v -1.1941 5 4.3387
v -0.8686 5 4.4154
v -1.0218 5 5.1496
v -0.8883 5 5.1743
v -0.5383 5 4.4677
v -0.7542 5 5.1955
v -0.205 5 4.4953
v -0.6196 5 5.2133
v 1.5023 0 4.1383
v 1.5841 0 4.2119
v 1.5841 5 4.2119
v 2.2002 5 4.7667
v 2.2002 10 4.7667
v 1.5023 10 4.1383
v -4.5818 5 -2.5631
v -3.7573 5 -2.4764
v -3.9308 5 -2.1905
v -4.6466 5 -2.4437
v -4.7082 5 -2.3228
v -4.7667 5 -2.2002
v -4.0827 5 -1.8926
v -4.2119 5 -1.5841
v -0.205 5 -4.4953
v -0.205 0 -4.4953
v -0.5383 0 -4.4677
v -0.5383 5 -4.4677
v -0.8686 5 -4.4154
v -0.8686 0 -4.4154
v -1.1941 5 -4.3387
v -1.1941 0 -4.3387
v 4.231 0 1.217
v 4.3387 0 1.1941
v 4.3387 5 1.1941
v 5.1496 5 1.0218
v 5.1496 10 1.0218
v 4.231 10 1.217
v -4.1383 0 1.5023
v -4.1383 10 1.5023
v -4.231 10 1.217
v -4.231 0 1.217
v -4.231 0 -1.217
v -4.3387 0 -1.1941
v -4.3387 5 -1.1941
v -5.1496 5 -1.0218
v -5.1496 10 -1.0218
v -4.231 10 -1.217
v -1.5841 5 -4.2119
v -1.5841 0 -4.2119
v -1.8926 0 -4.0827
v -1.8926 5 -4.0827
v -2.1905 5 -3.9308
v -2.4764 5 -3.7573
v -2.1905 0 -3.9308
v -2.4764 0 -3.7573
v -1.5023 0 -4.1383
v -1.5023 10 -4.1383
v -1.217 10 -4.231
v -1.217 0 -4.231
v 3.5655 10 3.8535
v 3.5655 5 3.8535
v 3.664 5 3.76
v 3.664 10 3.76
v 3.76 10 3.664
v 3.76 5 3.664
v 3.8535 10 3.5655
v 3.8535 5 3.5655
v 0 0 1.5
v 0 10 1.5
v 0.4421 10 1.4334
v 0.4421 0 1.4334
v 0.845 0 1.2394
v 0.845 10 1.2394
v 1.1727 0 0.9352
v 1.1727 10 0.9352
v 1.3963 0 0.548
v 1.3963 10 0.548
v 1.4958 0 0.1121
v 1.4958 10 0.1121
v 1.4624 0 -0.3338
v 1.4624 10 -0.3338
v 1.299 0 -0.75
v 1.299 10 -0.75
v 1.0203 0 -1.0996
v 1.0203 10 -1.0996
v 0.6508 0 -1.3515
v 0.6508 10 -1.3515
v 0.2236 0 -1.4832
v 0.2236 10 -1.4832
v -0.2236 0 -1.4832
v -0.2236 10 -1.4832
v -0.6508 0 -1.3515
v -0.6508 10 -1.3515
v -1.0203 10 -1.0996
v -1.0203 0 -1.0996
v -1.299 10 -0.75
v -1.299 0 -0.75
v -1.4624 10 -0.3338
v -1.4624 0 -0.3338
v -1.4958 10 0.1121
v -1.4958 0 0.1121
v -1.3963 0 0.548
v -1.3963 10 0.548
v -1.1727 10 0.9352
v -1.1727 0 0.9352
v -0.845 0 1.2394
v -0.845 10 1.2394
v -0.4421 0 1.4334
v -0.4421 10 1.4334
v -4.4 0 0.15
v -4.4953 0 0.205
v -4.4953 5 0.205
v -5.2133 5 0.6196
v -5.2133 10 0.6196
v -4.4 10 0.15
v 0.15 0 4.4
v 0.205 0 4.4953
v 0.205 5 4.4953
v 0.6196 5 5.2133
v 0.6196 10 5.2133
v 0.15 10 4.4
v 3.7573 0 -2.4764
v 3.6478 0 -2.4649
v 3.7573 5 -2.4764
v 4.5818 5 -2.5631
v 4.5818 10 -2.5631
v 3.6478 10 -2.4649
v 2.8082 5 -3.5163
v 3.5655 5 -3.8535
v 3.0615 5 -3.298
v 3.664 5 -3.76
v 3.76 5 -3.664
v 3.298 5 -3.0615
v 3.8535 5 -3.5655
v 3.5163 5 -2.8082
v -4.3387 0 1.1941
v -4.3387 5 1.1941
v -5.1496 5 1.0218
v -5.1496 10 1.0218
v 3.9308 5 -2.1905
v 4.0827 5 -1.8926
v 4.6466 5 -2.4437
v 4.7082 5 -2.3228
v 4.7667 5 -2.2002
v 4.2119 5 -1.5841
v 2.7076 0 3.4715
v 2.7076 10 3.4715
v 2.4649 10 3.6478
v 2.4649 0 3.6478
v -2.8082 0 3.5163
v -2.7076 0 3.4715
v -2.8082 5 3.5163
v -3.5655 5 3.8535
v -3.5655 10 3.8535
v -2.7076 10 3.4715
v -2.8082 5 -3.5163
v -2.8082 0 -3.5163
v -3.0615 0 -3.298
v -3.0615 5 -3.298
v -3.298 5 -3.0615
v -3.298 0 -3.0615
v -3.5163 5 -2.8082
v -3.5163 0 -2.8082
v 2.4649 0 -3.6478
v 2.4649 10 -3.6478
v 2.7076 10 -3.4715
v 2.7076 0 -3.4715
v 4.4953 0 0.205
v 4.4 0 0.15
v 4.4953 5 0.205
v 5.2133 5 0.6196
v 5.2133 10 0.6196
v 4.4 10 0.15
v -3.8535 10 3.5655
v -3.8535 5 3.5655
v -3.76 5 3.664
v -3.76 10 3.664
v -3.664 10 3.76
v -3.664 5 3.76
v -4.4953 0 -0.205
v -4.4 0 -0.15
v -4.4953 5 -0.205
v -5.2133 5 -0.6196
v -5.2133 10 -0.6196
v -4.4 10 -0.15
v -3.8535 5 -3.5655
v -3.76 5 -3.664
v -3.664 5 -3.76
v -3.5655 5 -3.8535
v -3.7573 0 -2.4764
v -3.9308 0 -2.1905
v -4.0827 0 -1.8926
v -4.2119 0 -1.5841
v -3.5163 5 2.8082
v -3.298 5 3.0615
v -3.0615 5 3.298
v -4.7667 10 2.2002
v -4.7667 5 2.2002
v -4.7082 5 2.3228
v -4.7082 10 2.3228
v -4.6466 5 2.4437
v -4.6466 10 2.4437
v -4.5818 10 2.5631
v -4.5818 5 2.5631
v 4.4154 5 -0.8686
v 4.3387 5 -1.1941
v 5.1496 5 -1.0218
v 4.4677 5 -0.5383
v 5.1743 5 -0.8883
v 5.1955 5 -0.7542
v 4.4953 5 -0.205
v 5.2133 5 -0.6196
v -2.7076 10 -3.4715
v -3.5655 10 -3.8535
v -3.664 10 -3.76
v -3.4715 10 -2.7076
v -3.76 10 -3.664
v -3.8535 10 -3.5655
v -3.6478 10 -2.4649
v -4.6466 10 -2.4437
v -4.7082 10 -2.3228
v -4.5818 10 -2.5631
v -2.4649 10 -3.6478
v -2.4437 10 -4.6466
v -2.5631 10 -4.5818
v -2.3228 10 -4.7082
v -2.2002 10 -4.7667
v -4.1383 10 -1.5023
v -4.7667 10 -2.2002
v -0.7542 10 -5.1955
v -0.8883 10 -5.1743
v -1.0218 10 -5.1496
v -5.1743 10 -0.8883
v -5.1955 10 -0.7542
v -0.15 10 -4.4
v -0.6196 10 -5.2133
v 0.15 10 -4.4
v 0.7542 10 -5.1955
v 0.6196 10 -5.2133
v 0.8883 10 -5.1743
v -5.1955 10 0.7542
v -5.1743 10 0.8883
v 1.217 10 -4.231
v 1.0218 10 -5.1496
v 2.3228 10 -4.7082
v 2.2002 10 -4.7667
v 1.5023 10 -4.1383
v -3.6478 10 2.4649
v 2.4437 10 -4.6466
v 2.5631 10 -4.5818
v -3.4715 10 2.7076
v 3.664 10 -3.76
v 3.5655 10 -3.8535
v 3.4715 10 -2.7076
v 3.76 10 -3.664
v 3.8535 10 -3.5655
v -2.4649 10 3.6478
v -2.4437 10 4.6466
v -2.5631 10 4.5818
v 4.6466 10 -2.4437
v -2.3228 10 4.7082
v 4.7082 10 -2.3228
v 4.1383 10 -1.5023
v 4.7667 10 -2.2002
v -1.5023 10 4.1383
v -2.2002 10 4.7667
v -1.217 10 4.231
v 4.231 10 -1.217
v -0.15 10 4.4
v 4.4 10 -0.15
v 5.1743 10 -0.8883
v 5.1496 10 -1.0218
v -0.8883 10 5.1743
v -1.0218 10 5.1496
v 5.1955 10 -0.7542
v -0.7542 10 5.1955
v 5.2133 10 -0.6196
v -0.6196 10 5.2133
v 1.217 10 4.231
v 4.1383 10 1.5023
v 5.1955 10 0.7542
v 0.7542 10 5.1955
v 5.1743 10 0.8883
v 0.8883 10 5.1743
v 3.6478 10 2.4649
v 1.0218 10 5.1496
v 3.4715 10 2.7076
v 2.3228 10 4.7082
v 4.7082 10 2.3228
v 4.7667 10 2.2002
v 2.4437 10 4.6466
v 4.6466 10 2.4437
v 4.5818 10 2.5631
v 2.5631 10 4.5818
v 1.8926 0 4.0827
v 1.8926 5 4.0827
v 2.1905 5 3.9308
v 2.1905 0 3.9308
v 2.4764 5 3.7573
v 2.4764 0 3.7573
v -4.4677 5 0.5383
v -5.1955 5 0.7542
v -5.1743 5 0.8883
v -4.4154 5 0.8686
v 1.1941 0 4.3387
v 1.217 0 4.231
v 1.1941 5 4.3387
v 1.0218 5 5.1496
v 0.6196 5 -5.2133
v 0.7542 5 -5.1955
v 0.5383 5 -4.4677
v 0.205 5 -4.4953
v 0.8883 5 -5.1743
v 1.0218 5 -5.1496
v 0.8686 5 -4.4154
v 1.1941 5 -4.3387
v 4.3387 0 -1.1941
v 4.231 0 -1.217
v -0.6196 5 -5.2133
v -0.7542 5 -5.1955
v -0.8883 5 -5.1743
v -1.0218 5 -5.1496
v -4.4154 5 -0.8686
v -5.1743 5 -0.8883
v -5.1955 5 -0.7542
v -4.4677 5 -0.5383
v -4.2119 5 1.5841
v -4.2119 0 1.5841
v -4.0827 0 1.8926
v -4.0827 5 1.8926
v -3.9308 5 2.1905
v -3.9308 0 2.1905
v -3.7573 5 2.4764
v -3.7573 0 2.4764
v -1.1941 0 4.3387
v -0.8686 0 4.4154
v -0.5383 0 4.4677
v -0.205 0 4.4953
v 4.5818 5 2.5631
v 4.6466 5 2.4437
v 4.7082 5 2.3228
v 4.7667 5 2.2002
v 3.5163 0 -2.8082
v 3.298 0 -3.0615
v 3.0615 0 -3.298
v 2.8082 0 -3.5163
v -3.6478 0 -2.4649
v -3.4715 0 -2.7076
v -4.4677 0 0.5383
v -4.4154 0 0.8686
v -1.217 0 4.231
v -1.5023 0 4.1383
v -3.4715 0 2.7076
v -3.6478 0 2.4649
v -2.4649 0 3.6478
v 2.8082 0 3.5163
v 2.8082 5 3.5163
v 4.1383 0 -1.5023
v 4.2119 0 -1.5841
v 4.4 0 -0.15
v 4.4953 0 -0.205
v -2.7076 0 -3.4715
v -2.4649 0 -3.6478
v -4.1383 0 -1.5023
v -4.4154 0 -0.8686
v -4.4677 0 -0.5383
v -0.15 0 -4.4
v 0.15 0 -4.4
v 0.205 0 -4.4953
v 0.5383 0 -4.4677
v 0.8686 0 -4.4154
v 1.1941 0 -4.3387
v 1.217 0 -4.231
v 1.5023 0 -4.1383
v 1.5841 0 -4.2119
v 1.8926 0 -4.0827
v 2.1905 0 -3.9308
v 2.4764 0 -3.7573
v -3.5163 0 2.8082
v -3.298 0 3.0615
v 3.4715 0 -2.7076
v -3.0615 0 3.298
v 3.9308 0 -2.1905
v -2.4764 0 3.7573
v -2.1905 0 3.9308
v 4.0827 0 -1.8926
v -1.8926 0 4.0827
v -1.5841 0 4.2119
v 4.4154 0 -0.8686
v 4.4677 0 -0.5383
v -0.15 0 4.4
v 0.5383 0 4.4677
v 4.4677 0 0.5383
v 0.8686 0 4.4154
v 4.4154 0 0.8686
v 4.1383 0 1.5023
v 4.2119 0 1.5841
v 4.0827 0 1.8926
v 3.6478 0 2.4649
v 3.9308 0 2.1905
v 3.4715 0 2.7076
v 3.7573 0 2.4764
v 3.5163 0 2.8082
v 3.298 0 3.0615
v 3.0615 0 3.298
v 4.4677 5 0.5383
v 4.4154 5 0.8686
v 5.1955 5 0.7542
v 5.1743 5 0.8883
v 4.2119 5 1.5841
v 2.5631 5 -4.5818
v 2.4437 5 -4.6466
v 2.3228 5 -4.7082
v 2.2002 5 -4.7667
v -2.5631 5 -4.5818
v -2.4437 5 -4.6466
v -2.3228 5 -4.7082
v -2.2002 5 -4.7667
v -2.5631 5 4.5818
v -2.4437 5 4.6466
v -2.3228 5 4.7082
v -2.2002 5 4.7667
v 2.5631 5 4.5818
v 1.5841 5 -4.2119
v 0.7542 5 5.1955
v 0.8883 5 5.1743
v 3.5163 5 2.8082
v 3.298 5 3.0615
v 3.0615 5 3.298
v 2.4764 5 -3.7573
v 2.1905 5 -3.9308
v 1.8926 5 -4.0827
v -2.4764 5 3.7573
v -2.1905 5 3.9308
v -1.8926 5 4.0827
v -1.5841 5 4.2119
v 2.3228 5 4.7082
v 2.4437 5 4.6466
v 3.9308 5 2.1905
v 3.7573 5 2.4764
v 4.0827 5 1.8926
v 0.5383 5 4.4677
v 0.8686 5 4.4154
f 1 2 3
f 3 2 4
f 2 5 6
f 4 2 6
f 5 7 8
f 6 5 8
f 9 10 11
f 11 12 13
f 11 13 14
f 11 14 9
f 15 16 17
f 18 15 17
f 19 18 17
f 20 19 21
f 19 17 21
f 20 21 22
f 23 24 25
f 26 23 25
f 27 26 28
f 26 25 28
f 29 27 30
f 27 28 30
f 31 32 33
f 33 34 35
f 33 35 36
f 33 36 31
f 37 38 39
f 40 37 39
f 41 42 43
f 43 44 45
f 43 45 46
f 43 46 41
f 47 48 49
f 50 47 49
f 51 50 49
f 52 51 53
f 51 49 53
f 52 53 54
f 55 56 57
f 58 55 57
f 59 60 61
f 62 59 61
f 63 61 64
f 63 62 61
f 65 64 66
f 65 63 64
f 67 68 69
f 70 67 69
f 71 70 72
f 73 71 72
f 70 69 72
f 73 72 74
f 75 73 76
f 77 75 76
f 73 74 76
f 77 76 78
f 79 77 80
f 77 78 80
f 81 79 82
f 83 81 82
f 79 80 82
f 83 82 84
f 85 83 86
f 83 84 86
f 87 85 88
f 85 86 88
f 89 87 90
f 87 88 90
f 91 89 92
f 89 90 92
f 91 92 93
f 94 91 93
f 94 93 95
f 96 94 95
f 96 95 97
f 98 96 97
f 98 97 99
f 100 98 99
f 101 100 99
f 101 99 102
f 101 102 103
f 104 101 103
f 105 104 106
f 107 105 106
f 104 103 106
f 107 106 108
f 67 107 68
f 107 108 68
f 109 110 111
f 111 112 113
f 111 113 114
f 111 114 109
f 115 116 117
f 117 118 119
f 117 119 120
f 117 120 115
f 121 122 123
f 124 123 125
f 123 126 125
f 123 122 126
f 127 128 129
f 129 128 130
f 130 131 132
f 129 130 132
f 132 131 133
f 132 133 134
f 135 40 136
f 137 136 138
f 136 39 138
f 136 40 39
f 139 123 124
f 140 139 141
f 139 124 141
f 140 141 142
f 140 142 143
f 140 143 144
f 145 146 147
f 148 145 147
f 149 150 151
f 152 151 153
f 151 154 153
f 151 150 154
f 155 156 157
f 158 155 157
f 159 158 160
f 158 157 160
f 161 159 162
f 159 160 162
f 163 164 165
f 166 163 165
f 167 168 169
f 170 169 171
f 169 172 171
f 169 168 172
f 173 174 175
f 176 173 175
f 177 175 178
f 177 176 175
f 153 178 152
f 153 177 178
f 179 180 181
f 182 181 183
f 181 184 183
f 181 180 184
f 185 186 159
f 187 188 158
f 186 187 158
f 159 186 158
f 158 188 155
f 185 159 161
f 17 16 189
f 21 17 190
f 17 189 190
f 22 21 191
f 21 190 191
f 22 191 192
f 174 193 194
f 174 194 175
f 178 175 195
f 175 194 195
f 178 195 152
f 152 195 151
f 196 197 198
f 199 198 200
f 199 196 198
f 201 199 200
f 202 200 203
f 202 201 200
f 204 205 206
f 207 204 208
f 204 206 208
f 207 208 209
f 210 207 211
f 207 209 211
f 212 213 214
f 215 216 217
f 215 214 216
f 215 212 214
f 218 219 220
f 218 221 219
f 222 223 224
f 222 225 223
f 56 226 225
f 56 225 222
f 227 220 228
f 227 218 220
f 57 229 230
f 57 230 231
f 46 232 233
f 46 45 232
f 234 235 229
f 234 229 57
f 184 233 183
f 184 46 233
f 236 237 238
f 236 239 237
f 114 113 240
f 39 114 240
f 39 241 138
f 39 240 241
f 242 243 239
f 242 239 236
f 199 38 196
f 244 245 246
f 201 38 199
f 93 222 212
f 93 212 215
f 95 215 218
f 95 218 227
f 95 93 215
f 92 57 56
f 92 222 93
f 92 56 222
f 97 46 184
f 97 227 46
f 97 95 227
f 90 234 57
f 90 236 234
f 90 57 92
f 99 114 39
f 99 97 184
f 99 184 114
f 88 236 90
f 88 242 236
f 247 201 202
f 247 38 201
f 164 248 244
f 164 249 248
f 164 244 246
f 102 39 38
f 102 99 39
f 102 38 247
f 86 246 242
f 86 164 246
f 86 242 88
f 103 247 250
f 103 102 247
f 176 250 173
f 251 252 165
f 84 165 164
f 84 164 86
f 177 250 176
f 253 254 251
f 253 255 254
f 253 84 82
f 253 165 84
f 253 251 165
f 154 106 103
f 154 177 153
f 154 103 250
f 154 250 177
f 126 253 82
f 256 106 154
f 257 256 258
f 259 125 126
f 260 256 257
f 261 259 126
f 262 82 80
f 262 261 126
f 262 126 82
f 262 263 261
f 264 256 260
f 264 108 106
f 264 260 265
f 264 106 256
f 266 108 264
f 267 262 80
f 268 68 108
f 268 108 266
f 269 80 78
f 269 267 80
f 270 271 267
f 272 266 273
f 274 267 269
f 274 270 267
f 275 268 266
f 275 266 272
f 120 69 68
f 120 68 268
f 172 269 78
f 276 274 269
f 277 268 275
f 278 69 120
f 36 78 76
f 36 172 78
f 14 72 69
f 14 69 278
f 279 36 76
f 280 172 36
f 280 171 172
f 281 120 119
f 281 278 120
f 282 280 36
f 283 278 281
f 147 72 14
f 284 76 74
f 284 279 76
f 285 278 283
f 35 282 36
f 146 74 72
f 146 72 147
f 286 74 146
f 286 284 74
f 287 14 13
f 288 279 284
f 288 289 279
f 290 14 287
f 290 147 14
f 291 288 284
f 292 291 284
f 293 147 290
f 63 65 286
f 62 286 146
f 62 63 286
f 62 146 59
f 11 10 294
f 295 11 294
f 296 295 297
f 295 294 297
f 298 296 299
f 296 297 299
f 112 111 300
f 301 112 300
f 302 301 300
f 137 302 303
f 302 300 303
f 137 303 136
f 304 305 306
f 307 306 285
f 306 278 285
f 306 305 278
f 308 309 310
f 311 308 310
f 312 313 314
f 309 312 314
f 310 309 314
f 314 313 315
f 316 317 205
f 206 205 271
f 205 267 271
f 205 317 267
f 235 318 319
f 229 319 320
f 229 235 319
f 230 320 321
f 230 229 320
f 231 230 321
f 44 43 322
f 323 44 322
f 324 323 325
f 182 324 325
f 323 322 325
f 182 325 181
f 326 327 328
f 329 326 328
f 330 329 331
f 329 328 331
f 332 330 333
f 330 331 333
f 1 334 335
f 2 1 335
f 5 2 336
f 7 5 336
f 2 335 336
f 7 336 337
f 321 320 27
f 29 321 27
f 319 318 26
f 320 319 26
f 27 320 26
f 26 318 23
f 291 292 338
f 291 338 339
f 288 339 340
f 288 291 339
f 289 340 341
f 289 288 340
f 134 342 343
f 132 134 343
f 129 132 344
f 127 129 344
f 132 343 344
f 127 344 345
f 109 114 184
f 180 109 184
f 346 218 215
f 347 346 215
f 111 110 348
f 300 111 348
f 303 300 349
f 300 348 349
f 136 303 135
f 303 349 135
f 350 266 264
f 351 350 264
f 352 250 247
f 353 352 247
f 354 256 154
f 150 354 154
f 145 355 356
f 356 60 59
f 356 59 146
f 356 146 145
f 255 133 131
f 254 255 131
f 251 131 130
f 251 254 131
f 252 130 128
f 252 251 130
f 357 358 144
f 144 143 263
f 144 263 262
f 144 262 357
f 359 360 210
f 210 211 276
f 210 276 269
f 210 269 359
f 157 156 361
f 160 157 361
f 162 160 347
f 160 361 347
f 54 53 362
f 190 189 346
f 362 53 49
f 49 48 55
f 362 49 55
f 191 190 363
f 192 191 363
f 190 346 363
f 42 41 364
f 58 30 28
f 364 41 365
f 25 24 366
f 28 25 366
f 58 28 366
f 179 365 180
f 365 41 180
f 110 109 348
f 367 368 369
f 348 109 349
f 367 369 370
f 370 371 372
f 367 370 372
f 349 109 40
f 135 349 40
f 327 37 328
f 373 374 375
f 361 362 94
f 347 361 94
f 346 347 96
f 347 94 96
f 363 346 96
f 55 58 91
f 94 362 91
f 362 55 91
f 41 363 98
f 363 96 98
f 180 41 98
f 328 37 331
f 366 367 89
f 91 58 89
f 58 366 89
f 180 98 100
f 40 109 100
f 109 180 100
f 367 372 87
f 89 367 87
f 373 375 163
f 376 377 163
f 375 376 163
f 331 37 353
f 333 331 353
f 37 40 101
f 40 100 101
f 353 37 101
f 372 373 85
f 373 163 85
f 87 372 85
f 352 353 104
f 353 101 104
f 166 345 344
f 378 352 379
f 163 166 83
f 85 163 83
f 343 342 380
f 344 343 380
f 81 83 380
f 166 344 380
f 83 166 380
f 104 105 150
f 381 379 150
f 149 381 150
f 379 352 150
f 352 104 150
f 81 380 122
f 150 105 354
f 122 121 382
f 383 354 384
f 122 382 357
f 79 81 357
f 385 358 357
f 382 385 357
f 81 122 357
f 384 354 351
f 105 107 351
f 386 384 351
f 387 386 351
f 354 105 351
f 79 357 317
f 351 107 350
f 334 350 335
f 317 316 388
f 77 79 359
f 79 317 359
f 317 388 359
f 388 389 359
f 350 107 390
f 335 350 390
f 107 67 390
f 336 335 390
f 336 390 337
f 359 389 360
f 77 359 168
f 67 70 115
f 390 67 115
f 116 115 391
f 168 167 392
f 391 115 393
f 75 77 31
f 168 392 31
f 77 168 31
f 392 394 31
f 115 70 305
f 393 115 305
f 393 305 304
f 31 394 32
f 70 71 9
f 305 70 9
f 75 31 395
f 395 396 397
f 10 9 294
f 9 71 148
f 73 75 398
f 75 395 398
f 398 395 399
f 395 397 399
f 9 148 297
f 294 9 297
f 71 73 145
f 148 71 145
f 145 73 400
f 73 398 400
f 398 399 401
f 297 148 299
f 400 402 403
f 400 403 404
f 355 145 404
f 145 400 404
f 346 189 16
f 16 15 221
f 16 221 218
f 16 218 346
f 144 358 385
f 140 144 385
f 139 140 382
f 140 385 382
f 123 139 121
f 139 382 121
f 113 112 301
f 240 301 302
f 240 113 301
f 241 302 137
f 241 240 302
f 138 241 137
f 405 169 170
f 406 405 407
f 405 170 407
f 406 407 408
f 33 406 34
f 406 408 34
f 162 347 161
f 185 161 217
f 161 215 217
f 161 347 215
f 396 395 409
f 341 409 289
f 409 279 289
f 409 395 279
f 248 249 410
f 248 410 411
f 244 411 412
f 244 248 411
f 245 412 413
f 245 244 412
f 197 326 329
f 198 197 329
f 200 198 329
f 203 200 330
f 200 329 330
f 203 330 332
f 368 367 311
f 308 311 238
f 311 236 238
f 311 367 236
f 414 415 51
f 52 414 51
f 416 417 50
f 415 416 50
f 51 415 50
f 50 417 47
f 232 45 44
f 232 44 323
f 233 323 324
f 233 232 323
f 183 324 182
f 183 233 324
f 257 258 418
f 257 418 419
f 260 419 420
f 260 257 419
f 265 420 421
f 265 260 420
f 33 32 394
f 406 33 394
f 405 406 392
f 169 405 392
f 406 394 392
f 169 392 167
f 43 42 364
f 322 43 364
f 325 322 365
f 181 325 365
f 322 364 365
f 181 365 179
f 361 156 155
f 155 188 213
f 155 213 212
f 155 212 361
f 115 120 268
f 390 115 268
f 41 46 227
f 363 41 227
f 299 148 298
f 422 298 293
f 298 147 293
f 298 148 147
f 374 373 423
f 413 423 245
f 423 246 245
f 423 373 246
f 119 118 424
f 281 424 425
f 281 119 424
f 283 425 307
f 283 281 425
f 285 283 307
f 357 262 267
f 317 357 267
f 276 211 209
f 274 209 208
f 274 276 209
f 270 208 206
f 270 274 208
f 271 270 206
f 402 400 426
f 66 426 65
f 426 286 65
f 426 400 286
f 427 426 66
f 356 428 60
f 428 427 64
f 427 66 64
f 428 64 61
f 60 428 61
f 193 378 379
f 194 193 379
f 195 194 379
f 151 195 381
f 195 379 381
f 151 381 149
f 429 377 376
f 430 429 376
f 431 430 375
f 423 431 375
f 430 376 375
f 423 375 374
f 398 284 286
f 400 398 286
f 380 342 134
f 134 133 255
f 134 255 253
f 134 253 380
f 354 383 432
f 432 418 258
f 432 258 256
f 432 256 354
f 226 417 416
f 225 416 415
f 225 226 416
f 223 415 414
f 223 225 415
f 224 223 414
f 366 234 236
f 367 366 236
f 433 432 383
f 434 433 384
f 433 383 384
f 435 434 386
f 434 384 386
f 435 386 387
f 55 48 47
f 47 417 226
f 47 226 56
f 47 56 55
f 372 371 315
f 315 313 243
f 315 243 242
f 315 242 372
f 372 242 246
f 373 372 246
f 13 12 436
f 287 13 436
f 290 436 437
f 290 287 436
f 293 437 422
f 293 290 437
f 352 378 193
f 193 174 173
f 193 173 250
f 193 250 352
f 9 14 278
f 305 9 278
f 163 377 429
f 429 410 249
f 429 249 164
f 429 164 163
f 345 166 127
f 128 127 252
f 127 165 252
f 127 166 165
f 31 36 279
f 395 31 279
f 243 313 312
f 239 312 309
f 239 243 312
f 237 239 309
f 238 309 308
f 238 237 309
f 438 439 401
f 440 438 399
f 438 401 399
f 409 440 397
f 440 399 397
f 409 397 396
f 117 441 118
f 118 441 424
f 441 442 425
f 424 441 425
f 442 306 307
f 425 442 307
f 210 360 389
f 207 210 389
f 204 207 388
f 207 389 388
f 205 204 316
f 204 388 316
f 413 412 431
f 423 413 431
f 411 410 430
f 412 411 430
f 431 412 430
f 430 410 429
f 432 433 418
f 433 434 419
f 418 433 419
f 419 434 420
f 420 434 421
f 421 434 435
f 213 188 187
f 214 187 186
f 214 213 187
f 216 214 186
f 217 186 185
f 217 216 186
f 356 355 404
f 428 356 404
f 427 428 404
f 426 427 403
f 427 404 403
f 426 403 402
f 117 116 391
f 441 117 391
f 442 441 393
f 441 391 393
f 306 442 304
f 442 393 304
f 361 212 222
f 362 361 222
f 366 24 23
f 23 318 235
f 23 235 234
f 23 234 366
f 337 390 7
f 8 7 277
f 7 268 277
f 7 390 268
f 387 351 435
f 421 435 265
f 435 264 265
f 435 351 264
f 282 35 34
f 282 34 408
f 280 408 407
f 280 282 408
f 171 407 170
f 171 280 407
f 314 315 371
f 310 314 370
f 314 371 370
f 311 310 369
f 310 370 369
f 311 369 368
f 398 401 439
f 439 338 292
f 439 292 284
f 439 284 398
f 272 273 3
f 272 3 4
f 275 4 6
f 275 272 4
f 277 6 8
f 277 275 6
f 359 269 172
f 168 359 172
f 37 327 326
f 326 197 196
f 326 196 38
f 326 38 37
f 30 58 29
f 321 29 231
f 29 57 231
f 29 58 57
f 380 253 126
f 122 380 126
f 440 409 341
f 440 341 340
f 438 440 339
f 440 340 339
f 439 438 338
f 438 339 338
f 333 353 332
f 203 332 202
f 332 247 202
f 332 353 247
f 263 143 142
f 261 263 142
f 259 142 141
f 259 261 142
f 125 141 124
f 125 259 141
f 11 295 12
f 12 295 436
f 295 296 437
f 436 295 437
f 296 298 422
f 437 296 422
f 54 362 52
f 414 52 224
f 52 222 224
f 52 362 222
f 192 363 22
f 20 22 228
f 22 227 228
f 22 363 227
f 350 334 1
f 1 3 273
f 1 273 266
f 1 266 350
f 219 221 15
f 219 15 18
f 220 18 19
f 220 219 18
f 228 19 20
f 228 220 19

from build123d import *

# Parameters (mm, degrees)
SKETCH_1_R               = 4.5
EXTRUDE_1_DEPTH          = 10
SKETCH_2_R               = 5.25
EXTRUDE_2_DEPTH          = 5
CUT_EXTRUDE_3_DEPTH      = 10
PATTERN_CIRCULAR_2_COUNT = 20
SKETCH_5_R               = 1.5
CUT_EXTRUDE_4_DEPTH      = 10


with BuildPart() as part:
    # 스케치1 → 보스-돌출1 (new body)
    with BuildSketch(Plane(origin=(0, 0, 0), x_dir=(1, 0, 0), z_dir=(0, 1, 0))):
        with Locations(Location((0, 0, 0), (0, 0, 270))):
            Circle(SKETCH_1_R)
    extrude(amount=EXTRUDE_1_DEPTH)

    # 스케치2 → 보스-돌출2 (add)
    with BuildSketch(Plane(origin=(0, 10, 0), x_dir=(1, 0, 0), z_dir=(0, 1, 0))):
        with Locations(Location((0, 0, 0), (0, 0, 270))):
            Circle(SKETCH_2_R)
    extrude(amount=-EXTRUDE_2_DEPTH)

    # 스케치4 → 컷-돌출3 (cut)
    with BuildSketch(Plane(origin=(0, 10, 0), x_dir=(1, 0, 0), z_dir=(0, 1, 0))):
        Polygon((0, 4.4), (0.15, 4.4), (0.727350269, 5.4), (-0.727350269, 5.4), (-0.15, 4.4), align=None)
    cut_extrude_3 = extrude(amount=-CUT_EXTRUDE_3_DEPTH, mode=Mode.SUBTRACT)

    # 원형 패턴2: 컷-돌출3 ×20 about axis
    pattern_circular_2_axis = Axis((0, 0, 0), (0, 1, 0))
    for i in range(1, PATTERN_CIRCULAR_2_COUNT):
        add(cut_extrude_3.rotate(pattern_circular_2_axis, i * 360 / PATTERN_CIRCULAR_2_COUNT), mode=Mode.SUBTRACT)

    # 스케치5 → 컷-돌출4 (cut)
    with BuildSketch(Plane(origin=(0, 10, 0), x_dir=(1, 0, 0), z_dir=(0, 1, 0))):
        with Locations(Location((0, 0, 0), (0, 0, 270))):
            Circle(SKETCH_5_R)
    extrude(amount=-CUT_EXTRUDE_4_DEPTH, mode=Mode.SUBTRACT)


solid = part.part
